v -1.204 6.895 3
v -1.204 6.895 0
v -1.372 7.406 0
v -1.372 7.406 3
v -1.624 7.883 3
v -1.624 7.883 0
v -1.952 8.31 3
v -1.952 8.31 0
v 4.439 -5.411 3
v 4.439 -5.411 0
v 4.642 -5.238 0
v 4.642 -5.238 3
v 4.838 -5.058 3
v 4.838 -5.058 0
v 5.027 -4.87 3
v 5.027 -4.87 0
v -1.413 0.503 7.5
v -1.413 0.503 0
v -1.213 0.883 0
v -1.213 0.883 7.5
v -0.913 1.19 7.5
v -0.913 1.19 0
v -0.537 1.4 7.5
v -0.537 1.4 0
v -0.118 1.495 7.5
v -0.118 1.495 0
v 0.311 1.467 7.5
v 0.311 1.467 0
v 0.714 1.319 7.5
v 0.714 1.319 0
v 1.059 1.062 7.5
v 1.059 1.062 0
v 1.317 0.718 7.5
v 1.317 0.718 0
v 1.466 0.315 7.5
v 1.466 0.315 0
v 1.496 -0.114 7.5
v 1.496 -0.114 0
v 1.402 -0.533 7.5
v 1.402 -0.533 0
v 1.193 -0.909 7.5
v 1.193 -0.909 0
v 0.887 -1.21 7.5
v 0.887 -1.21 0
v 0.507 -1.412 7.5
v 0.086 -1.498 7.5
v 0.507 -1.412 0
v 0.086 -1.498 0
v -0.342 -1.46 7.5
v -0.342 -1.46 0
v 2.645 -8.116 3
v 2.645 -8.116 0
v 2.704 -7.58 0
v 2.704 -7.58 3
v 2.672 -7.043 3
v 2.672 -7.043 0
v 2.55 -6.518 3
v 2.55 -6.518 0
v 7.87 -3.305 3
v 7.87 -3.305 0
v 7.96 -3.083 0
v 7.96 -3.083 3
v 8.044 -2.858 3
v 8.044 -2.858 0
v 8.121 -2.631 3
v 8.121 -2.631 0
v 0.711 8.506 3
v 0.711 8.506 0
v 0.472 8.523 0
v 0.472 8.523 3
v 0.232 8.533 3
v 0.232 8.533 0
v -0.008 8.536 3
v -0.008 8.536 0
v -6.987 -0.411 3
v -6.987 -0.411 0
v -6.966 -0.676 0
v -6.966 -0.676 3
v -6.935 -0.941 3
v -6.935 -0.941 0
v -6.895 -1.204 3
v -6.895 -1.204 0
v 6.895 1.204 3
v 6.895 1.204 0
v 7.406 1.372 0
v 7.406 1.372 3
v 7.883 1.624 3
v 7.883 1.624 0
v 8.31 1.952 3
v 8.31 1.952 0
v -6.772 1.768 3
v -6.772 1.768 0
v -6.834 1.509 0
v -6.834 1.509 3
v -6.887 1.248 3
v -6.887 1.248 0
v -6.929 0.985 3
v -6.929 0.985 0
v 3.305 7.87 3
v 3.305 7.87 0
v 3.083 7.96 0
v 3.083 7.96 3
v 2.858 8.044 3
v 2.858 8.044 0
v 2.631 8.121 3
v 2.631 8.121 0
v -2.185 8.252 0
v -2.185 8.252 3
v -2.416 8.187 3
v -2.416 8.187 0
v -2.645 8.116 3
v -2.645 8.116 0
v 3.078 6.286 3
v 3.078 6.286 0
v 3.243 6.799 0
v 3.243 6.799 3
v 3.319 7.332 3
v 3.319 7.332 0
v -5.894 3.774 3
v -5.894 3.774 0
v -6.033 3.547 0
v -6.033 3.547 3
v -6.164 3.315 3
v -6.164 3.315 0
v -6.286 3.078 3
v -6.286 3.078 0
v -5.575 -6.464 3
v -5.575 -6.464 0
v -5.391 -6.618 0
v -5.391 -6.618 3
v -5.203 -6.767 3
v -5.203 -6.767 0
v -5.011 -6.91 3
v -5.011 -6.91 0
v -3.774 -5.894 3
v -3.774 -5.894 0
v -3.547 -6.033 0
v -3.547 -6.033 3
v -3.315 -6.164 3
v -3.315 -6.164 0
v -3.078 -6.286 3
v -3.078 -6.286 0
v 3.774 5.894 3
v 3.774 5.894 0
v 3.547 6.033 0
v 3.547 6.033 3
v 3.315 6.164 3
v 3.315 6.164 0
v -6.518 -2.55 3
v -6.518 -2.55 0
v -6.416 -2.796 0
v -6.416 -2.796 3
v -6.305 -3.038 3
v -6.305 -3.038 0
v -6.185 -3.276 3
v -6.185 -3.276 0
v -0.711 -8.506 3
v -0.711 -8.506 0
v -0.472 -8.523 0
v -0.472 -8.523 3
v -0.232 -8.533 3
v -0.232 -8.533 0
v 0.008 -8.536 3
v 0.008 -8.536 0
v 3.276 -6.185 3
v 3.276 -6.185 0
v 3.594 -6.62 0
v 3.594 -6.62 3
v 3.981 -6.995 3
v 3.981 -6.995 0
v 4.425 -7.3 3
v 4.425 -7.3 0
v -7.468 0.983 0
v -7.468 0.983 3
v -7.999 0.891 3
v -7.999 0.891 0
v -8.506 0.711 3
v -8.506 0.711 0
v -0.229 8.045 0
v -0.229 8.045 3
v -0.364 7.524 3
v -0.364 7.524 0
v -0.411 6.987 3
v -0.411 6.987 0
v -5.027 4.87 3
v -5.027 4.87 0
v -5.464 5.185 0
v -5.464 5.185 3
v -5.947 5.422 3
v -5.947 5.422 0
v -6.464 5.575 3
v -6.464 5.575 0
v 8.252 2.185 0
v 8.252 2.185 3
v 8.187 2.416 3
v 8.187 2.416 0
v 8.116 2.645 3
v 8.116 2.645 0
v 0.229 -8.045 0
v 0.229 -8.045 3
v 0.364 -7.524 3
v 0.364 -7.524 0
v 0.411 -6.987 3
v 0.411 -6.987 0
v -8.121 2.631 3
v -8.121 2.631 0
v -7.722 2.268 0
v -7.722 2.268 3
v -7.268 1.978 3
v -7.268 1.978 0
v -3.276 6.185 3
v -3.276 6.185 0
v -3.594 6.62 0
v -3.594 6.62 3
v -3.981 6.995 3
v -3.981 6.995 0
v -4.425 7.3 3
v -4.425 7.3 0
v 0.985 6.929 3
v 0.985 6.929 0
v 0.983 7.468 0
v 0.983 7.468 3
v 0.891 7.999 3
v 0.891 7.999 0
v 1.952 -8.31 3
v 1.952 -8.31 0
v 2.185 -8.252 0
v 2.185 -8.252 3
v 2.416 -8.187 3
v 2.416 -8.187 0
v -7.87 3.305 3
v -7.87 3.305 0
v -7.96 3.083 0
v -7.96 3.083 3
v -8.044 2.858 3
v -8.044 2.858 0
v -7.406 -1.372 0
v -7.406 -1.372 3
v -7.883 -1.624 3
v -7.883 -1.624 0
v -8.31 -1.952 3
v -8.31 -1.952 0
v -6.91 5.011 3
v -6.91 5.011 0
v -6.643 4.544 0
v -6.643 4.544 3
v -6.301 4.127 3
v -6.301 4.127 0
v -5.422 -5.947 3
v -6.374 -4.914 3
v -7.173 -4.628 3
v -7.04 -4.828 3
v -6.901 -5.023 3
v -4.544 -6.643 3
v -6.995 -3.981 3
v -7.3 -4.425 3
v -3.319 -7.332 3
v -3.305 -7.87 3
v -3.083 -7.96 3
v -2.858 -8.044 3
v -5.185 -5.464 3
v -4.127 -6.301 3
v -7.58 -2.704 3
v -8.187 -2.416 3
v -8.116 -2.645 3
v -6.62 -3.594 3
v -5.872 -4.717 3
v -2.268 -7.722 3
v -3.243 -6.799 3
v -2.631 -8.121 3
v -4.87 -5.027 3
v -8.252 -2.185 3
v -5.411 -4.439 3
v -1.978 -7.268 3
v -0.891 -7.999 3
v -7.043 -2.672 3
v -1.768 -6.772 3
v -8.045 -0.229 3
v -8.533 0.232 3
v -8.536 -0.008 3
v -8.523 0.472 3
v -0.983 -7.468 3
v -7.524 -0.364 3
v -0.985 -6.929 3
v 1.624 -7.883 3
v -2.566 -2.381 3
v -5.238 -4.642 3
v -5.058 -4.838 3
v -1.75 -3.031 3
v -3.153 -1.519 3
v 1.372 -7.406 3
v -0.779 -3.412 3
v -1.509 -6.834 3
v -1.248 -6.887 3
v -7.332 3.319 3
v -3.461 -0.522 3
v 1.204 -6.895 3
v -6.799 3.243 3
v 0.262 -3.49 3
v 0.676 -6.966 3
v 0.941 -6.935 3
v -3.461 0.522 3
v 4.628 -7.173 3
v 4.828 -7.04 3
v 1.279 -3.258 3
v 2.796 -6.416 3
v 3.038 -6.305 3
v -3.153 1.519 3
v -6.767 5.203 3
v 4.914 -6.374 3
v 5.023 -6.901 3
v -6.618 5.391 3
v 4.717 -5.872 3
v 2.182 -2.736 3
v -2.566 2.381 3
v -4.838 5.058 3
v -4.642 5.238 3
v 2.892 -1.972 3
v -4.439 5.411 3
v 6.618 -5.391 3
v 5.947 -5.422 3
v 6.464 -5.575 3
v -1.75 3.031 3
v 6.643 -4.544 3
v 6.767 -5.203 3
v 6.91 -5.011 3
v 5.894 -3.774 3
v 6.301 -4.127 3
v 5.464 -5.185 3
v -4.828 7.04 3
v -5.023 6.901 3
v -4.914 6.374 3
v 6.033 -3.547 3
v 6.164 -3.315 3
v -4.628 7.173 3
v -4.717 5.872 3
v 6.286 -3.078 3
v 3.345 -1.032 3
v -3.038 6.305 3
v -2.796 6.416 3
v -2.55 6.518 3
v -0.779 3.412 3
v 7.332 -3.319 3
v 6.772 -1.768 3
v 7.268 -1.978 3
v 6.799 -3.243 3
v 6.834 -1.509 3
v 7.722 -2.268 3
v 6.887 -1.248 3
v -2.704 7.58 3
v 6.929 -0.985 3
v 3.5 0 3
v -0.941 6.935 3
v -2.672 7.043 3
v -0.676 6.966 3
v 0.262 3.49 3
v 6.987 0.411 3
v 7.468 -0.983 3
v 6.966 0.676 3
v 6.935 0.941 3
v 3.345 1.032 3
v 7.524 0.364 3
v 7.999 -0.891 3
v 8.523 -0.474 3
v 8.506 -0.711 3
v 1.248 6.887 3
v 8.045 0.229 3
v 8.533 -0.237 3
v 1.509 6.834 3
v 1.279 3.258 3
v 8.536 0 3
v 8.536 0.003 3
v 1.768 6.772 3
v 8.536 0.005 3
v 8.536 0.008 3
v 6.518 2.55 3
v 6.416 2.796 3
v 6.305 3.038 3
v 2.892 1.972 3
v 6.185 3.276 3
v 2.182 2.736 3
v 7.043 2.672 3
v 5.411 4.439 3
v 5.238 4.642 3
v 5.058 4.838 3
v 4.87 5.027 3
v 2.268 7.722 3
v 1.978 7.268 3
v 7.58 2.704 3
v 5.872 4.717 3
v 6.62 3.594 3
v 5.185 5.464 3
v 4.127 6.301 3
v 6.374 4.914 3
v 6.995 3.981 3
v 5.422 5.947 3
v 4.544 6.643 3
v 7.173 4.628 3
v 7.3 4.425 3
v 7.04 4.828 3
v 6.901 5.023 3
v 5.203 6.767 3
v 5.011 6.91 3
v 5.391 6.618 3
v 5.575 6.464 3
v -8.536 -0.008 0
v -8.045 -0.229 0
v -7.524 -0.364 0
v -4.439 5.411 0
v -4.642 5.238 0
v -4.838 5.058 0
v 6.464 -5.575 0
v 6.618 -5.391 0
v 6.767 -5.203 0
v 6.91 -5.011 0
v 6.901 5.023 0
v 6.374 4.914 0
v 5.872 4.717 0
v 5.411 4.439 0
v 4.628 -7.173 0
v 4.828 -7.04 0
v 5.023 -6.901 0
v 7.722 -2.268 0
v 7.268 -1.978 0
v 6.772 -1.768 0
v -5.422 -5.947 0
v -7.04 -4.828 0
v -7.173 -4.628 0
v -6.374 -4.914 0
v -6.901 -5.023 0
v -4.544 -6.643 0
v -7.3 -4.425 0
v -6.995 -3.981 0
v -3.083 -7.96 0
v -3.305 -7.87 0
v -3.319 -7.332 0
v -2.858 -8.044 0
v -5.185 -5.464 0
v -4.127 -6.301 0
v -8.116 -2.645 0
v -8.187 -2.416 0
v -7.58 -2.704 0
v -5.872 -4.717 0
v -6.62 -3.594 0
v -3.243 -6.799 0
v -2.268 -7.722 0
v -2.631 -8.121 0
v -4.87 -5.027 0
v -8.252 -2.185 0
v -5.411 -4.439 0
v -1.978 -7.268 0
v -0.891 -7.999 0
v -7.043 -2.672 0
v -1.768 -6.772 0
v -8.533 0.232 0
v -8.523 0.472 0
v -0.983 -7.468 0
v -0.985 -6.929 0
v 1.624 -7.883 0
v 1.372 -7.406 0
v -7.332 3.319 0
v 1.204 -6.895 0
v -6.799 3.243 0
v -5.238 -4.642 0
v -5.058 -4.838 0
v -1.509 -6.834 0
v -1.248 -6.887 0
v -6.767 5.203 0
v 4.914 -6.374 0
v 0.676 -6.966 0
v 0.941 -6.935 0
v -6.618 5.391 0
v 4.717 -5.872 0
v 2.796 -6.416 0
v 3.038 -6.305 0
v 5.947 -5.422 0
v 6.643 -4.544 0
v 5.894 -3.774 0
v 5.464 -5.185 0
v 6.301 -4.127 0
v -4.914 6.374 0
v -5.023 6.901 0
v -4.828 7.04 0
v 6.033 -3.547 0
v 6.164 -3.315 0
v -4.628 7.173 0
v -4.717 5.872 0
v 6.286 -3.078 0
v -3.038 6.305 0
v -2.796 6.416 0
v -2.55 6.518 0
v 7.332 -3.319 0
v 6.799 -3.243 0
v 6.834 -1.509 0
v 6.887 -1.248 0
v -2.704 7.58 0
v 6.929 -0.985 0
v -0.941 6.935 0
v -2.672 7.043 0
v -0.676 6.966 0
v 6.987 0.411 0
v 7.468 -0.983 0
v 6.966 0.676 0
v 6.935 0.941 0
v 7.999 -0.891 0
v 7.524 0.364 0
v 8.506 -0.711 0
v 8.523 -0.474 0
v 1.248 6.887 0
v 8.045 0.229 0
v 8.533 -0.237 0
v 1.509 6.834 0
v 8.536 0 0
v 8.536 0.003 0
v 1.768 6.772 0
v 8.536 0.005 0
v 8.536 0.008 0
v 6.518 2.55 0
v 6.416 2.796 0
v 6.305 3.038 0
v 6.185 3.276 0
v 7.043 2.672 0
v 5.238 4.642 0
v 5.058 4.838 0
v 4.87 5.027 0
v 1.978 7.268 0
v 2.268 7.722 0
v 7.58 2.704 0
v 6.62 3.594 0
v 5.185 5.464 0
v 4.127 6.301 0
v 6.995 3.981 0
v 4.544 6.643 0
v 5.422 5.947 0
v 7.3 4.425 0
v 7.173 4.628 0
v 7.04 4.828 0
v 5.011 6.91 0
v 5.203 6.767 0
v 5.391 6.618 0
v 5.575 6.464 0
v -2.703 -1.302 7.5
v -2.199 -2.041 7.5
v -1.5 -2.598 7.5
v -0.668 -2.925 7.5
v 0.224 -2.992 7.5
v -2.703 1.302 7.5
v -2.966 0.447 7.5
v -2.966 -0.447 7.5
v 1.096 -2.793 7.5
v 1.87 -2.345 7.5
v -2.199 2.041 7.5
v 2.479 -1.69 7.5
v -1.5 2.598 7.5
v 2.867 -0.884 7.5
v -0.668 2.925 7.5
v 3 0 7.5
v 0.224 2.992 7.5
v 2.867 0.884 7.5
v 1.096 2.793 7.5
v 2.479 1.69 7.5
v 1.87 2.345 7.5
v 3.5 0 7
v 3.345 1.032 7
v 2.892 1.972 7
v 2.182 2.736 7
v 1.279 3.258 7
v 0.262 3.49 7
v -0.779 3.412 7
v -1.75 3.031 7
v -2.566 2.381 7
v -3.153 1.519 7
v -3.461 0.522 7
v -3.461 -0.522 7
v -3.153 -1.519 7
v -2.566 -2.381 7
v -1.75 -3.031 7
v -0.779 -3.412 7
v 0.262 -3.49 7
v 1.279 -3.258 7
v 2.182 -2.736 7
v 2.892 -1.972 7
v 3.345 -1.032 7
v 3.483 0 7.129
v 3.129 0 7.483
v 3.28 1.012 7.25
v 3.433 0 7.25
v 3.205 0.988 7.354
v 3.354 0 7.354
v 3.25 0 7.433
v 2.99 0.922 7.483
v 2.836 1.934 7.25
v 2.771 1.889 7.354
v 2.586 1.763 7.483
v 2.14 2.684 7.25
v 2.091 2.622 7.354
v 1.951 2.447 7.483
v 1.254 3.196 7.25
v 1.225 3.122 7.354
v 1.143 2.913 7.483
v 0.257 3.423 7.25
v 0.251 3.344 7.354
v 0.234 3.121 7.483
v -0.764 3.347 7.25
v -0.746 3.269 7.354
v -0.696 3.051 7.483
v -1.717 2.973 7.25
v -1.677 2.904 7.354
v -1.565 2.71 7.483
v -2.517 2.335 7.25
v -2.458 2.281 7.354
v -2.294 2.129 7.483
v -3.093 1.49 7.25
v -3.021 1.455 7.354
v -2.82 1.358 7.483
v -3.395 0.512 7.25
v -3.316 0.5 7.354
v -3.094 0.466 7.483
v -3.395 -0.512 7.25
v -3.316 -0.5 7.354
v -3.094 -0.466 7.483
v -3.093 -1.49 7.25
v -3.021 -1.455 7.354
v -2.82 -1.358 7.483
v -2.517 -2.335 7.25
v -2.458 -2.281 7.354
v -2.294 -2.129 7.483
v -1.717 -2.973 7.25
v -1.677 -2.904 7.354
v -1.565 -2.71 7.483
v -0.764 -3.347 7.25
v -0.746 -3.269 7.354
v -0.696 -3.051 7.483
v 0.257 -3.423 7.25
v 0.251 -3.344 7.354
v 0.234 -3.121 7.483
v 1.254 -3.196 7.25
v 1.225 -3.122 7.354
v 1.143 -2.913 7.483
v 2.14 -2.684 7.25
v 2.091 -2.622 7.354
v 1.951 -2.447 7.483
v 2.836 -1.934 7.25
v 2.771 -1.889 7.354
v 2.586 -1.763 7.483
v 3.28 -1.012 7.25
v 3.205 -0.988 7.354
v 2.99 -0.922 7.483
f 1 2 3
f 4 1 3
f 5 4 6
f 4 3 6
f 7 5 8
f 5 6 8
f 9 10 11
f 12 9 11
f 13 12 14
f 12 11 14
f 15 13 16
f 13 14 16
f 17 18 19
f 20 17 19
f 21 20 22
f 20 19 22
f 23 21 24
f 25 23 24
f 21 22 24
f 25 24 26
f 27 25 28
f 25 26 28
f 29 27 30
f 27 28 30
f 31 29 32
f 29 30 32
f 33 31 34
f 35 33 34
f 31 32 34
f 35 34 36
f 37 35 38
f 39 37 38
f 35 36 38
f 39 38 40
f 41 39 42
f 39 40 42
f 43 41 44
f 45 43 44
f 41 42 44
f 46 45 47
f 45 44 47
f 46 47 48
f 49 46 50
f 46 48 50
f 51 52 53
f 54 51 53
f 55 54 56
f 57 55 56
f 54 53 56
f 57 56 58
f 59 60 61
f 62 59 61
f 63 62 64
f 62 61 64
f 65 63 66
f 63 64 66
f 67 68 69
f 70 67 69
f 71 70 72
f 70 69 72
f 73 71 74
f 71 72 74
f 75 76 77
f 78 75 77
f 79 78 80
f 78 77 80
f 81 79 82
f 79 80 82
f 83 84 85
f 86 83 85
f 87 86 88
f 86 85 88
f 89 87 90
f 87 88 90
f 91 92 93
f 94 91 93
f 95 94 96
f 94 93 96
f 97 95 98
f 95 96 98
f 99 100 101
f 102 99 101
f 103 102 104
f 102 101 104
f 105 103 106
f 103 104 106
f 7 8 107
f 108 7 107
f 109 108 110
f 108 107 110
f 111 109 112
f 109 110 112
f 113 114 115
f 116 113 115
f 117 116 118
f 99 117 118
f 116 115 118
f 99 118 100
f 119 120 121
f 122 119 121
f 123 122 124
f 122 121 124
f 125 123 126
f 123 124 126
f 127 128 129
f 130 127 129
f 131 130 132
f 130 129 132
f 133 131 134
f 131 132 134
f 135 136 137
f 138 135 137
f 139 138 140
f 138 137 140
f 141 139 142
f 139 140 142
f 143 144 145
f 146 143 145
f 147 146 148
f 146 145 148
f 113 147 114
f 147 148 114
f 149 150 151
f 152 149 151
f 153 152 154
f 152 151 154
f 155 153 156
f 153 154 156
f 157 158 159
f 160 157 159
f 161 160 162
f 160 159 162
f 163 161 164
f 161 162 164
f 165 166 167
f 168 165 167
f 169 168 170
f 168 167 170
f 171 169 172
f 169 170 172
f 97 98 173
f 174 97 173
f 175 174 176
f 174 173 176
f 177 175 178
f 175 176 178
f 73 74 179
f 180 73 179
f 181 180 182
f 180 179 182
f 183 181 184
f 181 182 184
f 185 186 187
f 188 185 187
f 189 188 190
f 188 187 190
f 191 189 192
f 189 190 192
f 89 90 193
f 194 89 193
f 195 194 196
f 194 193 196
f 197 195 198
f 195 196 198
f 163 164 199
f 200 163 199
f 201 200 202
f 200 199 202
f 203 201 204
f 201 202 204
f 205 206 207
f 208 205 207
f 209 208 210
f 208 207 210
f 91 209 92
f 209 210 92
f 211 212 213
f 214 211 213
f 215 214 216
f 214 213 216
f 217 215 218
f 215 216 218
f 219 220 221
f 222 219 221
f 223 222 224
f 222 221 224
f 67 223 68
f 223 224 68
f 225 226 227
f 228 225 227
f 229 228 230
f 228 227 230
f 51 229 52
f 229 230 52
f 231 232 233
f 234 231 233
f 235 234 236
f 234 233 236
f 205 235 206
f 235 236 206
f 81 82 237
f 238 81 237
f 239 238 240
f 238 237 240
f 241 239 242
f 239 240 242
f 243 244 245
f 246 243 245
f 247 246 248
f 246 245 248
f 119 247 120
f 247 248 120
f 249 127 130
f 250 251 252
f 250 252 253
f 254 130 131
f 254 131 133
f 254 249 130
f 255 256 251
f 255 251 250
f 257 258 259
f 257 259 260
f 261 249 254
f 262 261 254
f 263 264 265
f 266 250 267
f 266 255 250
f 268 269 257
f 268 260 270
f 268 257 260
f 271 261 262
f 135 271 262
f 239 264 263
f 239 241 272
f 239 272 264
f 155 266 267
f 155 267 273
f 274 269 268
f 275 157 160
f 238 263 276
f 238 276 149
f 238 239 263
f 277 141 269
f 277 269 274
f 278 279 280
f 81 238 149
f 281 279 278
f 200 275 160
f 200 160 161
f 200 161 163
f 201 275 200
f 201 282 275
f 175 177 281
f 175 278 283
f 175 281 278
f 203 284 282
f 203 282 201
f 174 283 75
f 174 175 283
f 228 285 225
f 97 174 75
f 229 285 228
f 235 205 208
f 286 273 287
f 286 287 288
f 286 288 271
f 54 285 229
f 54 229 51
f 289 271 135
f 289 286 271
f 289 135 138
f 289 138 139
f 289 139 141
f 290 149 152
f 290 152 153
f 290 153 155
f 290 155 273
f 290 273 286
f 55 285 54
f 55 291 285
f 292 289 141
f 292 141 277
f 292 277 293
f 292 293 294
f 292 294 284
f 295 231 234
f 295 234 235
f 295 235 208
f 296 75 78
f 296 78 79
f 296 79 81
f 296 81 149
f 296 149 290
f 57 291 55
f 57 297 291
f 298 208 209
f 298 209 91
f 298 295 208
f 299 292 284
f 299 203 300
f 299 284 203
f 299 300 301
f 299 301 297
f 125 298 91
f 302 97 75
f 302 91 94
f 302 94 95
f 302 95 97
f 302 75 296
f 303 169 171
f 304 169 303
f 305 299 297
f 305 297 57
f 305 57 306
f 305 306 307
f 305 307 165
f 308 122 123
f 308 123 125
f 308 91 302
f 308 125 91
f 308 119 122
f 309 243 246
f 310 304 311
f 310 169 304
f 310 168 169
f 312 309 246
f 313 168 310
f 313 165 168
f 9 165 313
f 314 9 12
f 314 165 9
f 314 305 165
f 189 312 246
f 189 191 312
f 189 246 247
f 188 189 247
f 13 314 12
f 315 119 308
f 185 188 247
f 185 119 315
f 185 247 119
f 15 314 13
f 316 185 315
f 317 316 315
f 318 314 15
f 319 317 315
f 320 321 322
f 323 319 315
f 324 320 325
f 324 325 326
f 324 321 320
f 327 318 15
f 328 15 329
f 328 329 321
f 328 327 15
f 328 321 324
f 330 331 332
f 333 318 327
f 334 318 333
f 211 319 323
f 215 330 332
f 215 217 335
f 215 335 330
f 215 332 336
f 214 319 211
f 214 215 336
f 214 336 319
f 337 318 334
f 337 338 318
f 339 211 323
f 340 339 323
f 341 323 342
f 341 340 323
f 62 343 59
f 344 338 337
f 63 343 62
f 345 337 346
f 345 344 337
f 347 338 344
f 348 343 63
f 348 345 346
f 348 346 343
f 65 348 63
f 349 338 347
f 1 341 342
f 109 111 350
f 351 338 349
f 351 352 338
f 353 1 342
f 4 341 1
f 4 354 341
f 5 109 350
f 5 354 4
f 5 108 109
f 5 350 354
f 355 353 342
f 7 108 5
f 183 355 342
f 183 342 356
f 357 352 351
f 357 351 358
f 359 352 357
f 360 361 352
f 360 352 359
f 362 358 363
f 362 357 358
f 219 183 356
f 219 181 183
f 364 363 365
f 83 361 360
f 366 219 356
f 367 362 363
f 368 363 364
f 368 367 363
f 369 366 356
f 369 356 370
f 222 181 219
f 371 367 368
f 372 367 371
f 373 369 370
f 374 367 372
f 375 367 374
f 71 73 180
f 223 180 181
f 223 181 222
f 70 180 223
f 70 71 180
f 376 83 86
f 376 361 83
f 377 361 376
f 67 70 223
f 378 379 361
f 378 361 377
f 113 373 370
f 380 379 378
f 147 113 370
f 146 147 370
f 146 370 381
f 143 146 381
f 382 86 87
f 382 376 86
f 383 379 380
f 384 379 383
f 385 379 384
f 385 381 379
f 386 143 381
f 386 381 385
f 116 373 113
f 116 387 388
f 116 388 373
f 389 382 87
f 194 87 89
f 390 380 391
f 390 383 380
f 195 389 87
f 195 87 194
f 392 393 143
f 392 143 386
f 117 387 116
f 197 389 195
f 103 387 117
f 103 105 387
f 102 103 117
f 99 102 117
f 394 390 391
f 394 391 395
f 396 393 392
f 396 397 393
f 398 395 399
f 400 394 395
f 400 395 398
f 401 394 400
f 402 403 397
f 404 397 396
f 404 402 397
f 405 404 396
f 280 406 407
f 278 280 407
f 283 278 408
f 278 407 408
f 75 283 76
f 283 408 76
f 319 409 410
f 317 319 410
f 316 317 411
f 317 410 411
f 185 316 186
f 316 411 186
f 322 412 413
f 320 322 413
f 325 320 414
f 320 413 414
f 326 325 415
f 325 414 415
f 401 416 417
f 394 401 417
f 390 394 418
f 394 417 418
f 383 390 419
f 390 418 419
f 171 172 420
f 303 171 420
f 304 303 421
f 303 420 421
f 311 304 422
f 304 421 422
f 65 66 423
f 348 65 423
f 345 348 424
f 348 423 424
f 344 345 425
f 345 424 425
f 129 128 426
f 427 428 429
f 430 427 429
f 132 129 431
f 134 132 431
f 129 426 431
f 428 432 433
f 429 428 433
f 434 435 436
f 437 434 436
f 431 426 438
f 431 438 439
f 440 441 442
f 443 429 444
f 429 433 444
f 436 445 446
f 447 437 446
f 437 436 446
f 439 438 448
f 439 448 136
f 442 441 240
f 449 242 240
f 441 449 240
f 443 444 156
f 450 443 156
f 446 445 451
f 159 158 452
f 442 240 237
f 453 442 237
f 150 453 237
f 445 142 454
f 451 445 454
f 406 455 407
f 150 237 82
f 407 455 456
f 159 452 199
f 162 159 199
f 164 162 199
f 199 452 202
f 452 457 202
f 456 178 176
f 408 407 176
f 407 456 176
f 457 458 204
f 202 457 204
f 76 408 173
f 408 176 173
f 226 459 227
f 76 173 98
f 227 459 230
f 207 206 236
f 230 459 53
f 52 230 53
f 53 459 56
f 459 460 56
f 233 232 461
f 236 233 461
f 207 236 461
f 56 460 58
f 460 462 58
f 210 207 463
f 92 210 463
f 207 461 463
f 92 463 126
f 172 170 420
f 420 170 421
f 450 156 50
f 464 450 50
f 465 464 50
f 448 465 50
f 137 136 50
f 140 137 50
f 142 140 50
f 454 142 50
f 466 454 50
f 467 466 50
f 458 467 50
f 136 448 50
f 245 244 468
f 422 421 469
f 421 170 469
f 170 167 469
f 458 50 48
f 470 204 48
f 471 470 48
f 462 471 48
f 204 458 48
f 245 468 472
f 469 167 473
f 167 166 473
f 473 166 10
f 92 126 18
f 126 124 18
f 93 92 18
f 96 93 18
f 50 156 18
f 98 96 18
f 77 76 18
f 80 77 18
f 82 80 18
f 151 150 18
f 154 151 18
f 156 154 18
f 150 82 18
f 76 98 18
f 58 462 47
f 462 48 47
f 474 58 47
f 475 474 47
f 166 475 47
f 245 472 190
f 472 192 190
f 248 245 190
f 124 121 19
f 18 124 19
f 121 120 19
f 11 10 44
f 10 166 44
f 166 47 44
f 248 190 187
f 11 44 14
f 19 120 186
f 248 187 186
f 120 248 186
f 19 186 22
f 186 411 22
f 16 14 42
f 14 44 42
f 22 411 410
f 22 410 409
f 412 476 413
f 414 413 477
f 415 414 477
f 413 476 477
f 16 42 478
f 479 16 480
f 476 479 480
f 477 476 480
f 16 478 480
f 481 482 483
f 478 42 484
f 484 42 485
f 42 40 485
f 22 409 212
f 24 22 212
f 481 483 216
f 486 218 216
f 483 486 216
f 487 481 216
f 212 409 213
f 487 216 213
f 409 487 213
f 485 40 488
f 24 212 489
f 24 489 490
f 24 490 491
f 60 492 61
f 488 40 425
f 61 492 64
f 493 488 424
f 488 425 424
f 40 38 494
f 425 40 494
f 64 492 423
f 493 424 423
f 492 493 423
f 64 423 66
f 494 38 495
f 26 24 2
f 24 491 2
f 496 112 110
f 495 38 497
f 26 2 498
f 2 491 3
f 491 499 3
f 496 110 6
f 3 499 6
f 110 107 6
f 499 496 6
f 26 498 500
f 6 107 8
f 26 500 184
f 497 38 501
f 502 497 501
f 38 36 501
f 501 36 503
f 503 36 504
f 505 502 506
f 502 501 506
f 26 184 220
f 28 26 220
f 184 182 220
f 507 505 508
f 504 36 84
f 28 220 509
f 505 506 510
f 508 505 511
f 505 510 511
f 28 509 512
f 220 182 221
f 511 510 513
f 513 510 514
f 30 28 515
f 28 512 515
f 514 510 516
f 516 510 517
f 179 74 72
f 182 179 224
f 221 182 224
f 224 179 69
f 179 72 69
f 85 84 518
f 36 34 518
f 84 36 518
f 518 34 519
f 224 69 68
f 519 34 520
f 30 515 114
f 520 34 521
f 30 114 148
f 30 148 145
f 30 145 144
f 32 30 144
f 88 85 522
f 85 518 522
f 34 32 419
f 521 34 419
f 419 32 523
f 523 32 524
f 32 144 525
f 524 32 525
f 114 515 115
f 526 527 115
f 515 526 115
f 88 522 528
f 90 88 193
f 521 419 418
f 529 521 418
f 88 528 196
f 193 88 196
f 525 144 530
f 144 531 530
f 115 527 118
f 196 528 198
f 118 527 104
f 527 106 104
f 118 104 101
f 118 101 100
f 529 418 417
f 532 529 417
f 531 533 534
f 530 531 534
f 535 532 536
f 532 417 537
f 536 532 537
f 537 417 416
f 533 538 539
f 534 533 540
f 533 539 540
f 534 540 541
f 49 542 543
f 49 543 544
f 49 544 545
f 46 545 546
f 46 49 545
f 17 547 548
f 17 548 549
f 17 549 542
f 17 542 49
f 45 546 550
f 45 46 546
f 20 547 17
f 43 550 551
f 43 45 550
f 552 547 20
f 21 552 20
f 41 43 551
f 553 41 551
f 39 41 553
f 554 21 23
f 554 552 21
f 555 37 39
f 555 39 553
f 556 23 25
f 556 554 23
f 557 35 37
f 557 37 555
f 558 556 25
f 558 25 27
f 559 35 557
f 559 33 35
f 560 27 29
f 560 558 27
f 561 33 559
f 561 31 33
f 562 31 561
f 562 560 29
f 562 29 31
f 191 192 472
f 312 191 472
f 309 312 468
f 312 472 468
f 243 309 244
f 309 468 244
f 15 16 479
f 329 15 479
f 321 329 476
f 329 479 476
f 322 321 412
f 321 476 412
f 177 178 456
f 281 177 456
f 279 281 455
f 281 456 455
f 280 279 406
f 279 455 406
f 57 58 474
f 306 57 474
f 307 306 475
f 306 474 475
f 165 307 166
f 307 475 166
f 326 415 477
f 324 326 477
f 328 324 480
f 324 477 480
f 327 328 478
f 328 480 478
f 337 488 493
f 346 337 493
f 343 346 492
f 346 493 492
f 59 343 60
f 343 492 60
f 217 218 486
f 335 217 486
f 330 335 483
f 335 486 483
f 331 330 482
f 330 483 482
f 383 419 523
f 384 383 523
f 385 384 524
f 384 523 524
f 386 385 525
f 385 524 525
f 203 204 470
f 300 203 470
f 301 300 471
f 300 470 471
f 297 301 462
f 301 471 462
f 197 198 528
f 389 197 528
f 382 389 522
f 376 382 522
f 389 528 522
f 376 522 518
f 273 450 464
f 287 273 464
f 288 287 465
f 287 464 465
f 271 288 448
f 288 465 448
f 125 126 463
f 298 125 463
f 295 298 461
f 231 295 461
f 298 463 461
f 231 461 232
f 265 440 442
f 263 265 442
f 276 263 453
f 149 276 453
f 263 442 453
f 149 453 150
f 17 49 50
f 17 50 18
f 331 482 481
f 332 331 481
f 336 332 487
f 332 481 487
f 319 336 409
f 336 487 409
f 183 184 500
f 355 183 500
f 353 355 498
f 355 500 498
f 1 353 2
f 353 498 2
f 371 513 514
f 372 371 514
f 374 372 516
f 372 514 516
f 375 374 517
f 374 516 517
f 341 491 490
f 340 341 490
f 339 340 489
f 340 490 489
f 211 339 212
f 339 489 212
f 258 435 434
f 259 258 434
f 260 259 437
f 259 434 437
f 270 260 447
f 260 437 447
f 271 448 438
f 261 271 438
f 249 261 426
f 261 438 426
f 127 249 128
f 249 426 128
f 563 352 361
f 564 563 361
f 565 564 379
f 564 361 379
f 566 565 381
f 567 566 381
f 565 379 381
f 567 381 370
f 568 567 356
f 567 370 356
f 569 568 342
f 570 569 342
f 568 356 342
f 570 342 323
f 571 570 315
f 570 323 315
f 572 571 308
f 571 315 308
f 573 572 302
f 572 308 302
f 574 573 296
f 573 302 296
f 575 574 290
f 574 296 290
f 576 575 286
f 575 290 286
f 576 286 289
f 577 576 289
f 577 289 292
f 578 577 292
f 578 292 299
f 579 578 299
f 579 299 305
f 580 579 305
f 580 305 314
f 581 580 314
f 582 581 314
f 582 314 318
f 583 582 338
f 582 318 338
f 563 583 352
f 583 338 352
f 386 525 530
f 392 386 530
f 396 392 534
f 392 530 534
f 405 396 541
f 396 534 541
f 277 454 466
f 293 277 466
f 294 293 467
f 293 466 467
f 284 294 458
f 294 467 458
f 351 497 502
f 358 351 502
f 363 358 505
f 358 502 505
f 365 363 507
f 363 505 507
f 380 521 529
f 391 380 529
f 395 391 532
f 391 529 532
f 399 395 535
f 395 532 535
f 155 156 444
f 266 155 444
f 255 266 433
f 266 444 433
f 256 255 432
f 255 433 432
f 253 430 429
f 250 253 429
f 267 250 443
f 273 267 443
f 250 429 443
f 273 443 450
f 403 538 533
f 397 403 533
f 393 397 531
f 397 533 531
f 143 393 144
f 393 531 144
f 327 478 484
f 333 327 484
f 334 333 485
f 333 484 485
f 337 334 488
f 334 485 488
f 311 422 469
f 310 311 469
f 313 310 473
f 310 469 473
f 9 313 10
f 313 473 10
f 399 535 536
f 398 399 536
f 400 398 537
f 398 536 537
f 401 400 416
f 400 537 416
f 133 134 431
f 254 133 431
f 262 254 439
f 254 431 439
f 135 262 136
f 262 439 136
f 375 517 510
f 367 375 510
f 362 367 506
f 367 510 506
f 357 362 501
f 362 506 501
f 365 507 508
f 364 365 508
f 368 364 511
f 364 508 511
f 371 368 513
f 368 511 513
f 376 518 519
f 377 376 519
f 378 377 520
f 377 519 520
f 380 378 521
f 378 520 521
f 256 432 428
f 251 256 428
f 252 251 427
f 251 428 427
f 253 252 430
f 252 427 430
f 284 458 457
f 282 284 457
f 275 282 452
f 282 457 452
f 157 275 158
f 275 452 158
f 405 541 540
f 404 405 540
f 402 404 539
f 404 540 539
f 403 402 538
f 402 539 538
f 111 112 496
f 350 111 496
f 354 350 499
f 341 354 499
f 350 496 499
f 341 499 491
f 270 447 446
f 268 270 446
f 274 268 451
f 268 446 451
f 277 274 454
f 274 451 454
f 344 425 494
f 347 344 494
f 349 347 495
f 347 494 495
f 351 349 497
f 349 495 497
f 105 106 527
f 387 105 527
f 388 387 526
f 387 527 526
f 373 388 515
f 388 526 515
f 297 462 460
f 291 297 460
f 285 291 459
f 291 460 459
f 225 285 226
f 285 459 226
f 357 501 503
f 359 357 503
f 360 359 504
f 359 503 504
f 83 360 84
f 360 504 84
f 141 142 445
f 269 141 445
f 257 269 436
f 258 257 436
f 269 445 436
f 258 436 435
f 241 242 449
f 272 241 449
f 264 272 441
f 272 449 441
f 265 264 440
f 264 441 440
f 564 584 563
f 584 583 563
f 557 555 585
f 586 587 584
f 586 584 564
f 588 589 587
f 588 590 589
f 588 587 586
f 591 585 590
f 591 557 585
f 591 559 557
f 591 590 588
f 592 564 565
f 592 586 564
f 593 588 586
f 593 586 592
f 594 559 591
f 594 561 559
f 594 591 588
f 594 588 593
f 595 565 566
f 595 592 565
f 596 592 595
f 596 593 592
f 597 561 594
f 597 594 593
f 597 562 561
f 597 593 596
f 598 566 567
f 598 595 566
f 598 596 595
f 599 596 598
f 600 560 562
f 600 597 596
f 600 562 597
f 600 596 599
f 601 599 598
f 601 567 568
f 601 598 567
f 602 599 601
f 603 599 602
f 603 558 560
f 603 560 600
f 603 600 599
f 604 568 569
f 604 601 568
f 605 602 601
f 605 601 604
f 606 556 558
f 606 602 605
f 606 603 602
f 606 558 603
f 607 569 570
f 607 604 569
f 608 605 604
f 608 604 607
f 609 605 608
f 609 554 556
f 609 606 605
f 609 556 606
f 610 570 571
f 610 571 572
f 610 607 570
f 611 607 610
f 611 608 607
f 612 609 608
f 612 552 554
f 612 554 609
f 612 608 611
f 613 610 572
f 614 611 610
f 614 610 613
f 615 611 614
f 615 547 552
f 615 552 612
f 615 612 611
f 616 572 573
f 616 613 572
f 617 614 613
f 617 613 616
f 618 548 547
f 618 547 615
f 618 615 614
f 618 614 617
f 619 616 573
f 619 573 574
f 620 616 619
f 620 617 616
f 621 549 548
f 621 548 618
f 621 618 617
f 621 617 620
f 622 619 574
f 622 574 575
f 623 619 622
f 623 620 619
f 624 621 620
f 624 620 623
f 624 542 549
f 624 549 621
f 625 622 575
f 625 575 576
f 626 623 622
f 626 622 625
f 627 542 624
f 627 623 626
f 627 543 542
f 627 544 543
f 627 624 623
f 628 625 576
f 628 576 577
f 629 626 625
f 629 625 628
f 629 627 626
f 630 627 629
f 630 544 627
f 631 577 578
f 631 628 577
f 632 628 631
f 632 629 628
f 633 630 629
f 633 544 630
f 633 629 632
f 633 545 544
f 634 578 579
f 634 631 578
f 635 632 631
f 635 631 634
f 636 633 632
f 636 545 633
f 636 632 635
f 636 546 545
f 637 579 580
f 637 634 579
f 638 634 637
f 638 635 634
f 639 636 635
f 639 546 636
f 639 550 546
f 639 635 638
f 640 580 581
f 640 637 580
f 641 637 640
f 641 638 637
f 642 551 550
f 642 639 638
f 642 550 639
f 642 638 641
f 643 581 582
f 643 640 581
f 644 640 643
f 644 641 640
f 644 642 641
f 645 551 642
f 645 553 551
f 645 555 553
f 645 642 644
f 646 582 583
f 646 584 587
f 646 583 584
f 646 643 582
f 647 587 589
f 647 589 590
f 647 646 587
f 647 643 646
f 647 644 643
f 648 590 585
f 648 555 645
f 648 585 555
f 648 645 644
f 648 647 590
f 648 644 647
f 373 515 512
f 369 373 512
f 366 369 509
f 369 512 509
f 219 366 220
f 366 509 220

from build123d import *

# Parameters (mm, degrees)
EXTRUDE_4_DEPTH     = 3
SKETCH_5_R          = 3.5
EXTRUDE_6_DEPTH     = 4.5
FILLET_1_R          = 0.5
CUT_EXTRUDE_1_DEPTH = 8.5


with BuildPart() as part:
    # 草图4 → 凸台-拉伸4 (new body)
    with BuildSketch(Plane.XY):
        with BuildLine():
            ThreePointArc((8.536063079, 0.007574004), (7.787120491, 0.307636704), (6.986931627, 0.410837493))
            ThreePointArc((6.986931627, 0.410837493), (6.952112765, 0.808782481), (6.894647301, 1.204092849))
            ThreePointArc((6.894647301, 1.204092849), (7.649774364, 1.488233206), (8.309831075, 1.95221355))
            ThreePointArc((8.309831075, 1.95221355), (8.220185959, 2.300646222), (8.115937918, 2.644991862))
            ThreePointArc((8.115937918, 2.644991862), (7.310926717, 2.698932461), (6.518011085, 2.549810286))
            ThreePointArc((6.518011085, 2.549810286), (6.361924616, 2.91751884), (6.18511409, 3.275723537))
            ThreePointArc((6.18511409, 3.275723537), (6.815478405, 3.77930417), (7.29985183, 4.424544441))
            ThreePointArc((7.29985183, 4.424544441), (7.106922641, 4.72822174), (6.901368208, 5.023499488))
            ThreePointArc((6.901368208, 5.023499488), (6.119088497, 4.826037904), (5.411062205, 4.439189883))
            ThreePointArc((5.411062205, 4.439189883), (5.148986959, 4.740668128), (4.870138818, 5.026703581))
            ThreePointArc((4.870138818, 5.026703581), (5.314035933, 5.70043051), (5.575312226, 6.463770094))
            ThreePointArc((5.575312226, 6.463770094), (5.297984218, 6.69296597), (5.011244492, 6.910271984))
            ThreePointArc((5.011244492, 6.910271984), (4.328271261, 6.480737132), (3.774440855, 5.894030644))
            ThreePointArc((3.774440855, 5.894030644), (3.432030584, 6.099767788), (3.078440426, 6.285634856))
            ThreePointArc((3.078440426, 6.285634856), (3.292418599, 7.063558994), (3.305022217, 7.870276894))
            ThreePointArc((3.305022217, 7.870276894), (2.970442186, 8.002556058), (2.63058525, 8.12061891))
            ThreePointArc((2.63058525, 8.12061891), (2.113772678, 7.501056656), (1.768350936, 6.77192262))
            ThreePointArc((1.768350936, 6.77192262), (1.379123142, 6.861779679), (0.985402836, 6.929284397))
            ThreePointArc((0.985402836, 6.929284397), (0.948516393, 7.735257109), (0.711213605, 8.506386157))
            ThreePointArc((0.711213605, 8.506386157), (0.352132577, 8.528800203), (-0.007574004, 8.536063079))
            ThreePointArc((-0.007574004, 8.536063079), (-0.307636703, 7.787120491), (-0.410837493, 6.986931627))
            ThreePointArc((-0.410837493, 6.986931627), (-0.808782481, 6.952112765), (-1.204092849, 6.894647301))
            ThreePointArc((-1.204092849, 6.894647301), (-1.488233206, 7.649774364), (-1.95221355, 8.309831075))
            ThreePointArc((-1.95221355, 8.309831075), (-2.300646222, 8.220185959), (-2.644991862, 8.115937918))
            ThreePointArc((-2.644991862, 8.115937918), (-2.698932461, 7.310926717), (-2.549810286, 6.518011085))
            ThreePointArc((-2.549810286, 6.518011085), (-2.91751884, 6.361924616), (-3.275723537, 6.18511409))
            ThreePointArc((-3.275723537, 6.18511409), (-3.77930417, 6.815478405), (-4.424544441, 7.29985183))
            ThreePointArc((-4.424544441, 7.29985183), (-4.72822174, 7.106922641), (-5.023499488, 6.901368208))
            ThreePointArc((-5.023499488, 6.901368208), (-4.826037904, 6.119088497), (-4.439189882, 5.411062205))
            ThreePointArc((-4.439189882, 5.411062205), (-4.740668128, 5.148986959), (-5.026703581, 4.870138818))
            ThreePointArc((-5.026703581, 4.870138818), (-5.70043051, 5.314035933), (-6.463770094, 5.575312226))
            ThreePointArc((-6.463770094, 5.575312226), (-6.69296597, 5.297984218), (-6.910271984, 5.011244492))
            ThreePointArc((-6.910271984, 5.011244492), (-6.480737132, 4.328271262), (-5.894030644, 3.774440855))
            ThreePointArc((-5.894030644, 3.774440855), (-6.099767788, 3.432030584), (-6.285634856, 3.078440426))
            ThreePointArc((-6.285634856, 3.078440426), (-7.063558994, 3.292418599), (-7.870276894, 3.305022217))
            ThreePointArc((-7.870276894, 3.305022217), (-8.002556058, 2.970442186), (-8.12061891, 2.63058525))
            ThreePointArc((-8.12061891, 2.63058525), (-7.501056656, 2.113772678), (-6.77192262, 1.768350936))
            ThreePointArc((-6.77192262, 1.768350936), (-6.861779679, 1.379123142), (-6.929284397, 0.985402836))
            ThreePointArc((-6.929284397, 0.985402836), (-7.735257109, 0.948516393), (-8.506386157, 0.711213605))
            ThreePointArc((-8.506386157, 0.711213605), (-8.528800203, 0.352132577), (-8.536063079, -0.007574004))
            ThreePointArc((-8.536063079, -0.007574004), (-7.787120492, -0.307636703), (-6.986931627, -0.410837493))
            ThreePointArc((-6.986931627, -0.410837493), (-6.952112765, -0.808782481), (-6.894647301, -1.204092849))
            ThreePointArc((-6.894647301, -1.204092849), (-7.649774364, -1.488233206), (-8.309831076, -1.95221355))
            ThreePointArc((-8.309831076, -1.95221355), (-8.220185959, -2.300646222), (-8.115937918, -2.644991862))
            ThreePointArc((-8.115937918, -2.644991862), (-7.310926717, -2.698932461), (-6.518011085, -2.549810286))
            ThreePointArc((-6.518011085, -2.549810286), (-6.361924616, -2.91751884), (-6.18511409, -3.275723537))
            ThreePointArc((-6.18511409, -3.275723537), (-6.815478405, -3.77930417), (-7.29985183, -4.424544441))
            ThreePointArc((-7.29985183, -4.424544441), (-7.106922641, -4.72822174), (-6.901368208, -5.023499488))
            ThreePointArc((-6.901368208, -5.023499488), (-6.119088498, -4.826037904), (-5.411062205, -4.439189883))
            ThreePointArc((-5.411062205, -4.439189883), (-5.148986959, -4.740668128), (-4.870138818, -5.026703582))
            ThreePointArc((-4.870138818, -5.026703582), (-5.314035933, -5.70043051), (-5.575312227, -6.463770094))
            ThreePointArc((-5.575312227, -6.463770094), (-5.297984218, -6.69296597), (-5.011244492, -6.910271984))
            ThreePointArc((-5.011244492, -6.910271984), (-4.328271262, -6.480737132), (-3.774440855, -5.894030644))
            ThreePointArc((-3.774440855, -5.894030644), (-3.432030584, -6.099767789), (-3.078440426, -6.285634856))
            ThreePointArc((-3.078440426, -6.285634856), (-3.292418599, -7.063558994), (-3.305022217, -7.870276894))
            ThreePointArc((-3.305022217, -7.870276894), (-2.970442186, -8.002556058), (-2.63058525, -8.12061891))
            ThreePointArc((-2.63058525, -8.12061891), (-2.113772678, -7.501056656), (-1.768350936, -6.77192262))
            ThreePointArc((-1.768350936, -6.77192262), (-1.379123142, -6.861779679), (-0.985402836, -6.929284397))
            ThreePointArc((-0.985402836, -6.929284397), (-0.948516393, -7.735257109), (-0.711213605, -8.506386157))
            ThreePointArc((-0.711213605, -8.506386157), (-0.352132577, -8.528800203), (0.007574004, -8.536063079))
            ThreePointArc((0.007574004, -8.536063079), (0.307636704, -7.787120491), (0.410837493, -6.986931627))
            ThreePointArc((0.410837493, -6.986931627), (0.808782481, -6.952112765), (1.204092849, -6.894647301))
            ThreePointArc((1.204092849, -6.894647301), (1.488233206, -7.649774364), (1.95221355, -8.309831075))
            ThreePointArc((1.95221355, -8.309831075), (2.300646222, -8.220185959), (2.644991862, -8.115937918))
            ThreePointArc((2.644991862, -8.115937918), (2.698932461, -7.310926717), (2.549810286, -6.518011085))
            ThreePointArc((2.549810286, -6.518011085), (2.91751884, -6.361924616), (3.275723537, -6.18511409))
            ThreePointArc((3.275723537, -6.18511409), (3.77930417, -6.815478405), (4.424544441, -7.29985183))
            ThreePointArc((4.424544441, -7.29985183), (4.72822174, -7.106922641), (5.023499488, -6.901368208))
            ThreePointArc((5.023499488, -6.901368208), (4.826037904, -6.119088497), (4.439189883, -5.411062205))
            ThreePointArc((4.439189883, -5.411062205), (4.740668128, -5.148986959), (5.026703582, -4.870138818))
            ThreePointArc((5.026703582, -4.870138818), (5.70043051, -5.314035933), (6.463770094, -5.575312226))
            ThreePointArc((6.463770094, -5.575312226), (6.69296597, -5.297984218), (6.910271984, -5.011244492))
            ThreePointArc((6.910271984, -5.011244492), (6.480737132, -4.328271261), (5.894030644, -3.774440855))
            ThreePointArc((5.894030644, -3.774440855), (6.099767788, -3.432030584), (6.285634856, -3.078440425))
            ThreePointArc((6.285634856, -3.078440425), (7.063558994, -3.292418599), (7.870276894, -3.305022217))
            ThreePointArc((7.870276894, -3.305022217), (8.002556058, -2.970442186), (8.12061891, -2.63058525))
            ThreePointArc((8.12061891, -2.63058525), (7.501056656, -2.113772678), (6.77192262, -1.768350936))
            ThreePointArc((6.77192262, -1.768350936), (6.861779679, -1.379123142), (6.929284397, -0.985402836))
            ThreePointArc((6.929284397, -0.985402836), (7.735257109, -0.948516393), (8.506386157, -0.711213605))
            ThreePointArc((8.506386157, -0.711213605), (8.528643141, -0.355916321), (8.536066439, 0))
            ThreePointArc((8.536066439, 0), (8.536065599, 0.003787002), (8.536063079, 0.007574004))
        make_face()
    extrude(amount=EXTRUDE_4_DEPTH)

    # 草图5 → 凸台-拉伸6 (add)
    with BuildSketch(Plane.XY.offset(3)):
        Circle(SKETCH_5_R)
    extrude(amount=EXTRUDE_6_DEPTH)

    # 圆角1
    fillet_1_edges = [part.edges().sort_by_distance(p)[0] for p in [
        (-3.5, 0, 7.5),
    ]]
    fillet(fillet_1_edges, radius=FILLET_1_R)

    # 草图8 → 切除-拉伸1 (cut, through all)
    with BuildSketch(Plane(origin=(0, 0, 0), x_dir=(-1, 0, 0), z_dir=(0, 0, -1))):
        with BuildLine():
            Line((0.342458427, -1.460384273), (1.413290623, 0.50260284))
            ThreePointArc((1.413290623, 0.50260284), (-1.316811787, 0.718336075), (0.342458427, -1.460384273))
        make_face()
    extrude(amount=-CUT_EXTRUDE_1_DEPTH, mode=Mode.SUBTRACT)


solid = part.part
